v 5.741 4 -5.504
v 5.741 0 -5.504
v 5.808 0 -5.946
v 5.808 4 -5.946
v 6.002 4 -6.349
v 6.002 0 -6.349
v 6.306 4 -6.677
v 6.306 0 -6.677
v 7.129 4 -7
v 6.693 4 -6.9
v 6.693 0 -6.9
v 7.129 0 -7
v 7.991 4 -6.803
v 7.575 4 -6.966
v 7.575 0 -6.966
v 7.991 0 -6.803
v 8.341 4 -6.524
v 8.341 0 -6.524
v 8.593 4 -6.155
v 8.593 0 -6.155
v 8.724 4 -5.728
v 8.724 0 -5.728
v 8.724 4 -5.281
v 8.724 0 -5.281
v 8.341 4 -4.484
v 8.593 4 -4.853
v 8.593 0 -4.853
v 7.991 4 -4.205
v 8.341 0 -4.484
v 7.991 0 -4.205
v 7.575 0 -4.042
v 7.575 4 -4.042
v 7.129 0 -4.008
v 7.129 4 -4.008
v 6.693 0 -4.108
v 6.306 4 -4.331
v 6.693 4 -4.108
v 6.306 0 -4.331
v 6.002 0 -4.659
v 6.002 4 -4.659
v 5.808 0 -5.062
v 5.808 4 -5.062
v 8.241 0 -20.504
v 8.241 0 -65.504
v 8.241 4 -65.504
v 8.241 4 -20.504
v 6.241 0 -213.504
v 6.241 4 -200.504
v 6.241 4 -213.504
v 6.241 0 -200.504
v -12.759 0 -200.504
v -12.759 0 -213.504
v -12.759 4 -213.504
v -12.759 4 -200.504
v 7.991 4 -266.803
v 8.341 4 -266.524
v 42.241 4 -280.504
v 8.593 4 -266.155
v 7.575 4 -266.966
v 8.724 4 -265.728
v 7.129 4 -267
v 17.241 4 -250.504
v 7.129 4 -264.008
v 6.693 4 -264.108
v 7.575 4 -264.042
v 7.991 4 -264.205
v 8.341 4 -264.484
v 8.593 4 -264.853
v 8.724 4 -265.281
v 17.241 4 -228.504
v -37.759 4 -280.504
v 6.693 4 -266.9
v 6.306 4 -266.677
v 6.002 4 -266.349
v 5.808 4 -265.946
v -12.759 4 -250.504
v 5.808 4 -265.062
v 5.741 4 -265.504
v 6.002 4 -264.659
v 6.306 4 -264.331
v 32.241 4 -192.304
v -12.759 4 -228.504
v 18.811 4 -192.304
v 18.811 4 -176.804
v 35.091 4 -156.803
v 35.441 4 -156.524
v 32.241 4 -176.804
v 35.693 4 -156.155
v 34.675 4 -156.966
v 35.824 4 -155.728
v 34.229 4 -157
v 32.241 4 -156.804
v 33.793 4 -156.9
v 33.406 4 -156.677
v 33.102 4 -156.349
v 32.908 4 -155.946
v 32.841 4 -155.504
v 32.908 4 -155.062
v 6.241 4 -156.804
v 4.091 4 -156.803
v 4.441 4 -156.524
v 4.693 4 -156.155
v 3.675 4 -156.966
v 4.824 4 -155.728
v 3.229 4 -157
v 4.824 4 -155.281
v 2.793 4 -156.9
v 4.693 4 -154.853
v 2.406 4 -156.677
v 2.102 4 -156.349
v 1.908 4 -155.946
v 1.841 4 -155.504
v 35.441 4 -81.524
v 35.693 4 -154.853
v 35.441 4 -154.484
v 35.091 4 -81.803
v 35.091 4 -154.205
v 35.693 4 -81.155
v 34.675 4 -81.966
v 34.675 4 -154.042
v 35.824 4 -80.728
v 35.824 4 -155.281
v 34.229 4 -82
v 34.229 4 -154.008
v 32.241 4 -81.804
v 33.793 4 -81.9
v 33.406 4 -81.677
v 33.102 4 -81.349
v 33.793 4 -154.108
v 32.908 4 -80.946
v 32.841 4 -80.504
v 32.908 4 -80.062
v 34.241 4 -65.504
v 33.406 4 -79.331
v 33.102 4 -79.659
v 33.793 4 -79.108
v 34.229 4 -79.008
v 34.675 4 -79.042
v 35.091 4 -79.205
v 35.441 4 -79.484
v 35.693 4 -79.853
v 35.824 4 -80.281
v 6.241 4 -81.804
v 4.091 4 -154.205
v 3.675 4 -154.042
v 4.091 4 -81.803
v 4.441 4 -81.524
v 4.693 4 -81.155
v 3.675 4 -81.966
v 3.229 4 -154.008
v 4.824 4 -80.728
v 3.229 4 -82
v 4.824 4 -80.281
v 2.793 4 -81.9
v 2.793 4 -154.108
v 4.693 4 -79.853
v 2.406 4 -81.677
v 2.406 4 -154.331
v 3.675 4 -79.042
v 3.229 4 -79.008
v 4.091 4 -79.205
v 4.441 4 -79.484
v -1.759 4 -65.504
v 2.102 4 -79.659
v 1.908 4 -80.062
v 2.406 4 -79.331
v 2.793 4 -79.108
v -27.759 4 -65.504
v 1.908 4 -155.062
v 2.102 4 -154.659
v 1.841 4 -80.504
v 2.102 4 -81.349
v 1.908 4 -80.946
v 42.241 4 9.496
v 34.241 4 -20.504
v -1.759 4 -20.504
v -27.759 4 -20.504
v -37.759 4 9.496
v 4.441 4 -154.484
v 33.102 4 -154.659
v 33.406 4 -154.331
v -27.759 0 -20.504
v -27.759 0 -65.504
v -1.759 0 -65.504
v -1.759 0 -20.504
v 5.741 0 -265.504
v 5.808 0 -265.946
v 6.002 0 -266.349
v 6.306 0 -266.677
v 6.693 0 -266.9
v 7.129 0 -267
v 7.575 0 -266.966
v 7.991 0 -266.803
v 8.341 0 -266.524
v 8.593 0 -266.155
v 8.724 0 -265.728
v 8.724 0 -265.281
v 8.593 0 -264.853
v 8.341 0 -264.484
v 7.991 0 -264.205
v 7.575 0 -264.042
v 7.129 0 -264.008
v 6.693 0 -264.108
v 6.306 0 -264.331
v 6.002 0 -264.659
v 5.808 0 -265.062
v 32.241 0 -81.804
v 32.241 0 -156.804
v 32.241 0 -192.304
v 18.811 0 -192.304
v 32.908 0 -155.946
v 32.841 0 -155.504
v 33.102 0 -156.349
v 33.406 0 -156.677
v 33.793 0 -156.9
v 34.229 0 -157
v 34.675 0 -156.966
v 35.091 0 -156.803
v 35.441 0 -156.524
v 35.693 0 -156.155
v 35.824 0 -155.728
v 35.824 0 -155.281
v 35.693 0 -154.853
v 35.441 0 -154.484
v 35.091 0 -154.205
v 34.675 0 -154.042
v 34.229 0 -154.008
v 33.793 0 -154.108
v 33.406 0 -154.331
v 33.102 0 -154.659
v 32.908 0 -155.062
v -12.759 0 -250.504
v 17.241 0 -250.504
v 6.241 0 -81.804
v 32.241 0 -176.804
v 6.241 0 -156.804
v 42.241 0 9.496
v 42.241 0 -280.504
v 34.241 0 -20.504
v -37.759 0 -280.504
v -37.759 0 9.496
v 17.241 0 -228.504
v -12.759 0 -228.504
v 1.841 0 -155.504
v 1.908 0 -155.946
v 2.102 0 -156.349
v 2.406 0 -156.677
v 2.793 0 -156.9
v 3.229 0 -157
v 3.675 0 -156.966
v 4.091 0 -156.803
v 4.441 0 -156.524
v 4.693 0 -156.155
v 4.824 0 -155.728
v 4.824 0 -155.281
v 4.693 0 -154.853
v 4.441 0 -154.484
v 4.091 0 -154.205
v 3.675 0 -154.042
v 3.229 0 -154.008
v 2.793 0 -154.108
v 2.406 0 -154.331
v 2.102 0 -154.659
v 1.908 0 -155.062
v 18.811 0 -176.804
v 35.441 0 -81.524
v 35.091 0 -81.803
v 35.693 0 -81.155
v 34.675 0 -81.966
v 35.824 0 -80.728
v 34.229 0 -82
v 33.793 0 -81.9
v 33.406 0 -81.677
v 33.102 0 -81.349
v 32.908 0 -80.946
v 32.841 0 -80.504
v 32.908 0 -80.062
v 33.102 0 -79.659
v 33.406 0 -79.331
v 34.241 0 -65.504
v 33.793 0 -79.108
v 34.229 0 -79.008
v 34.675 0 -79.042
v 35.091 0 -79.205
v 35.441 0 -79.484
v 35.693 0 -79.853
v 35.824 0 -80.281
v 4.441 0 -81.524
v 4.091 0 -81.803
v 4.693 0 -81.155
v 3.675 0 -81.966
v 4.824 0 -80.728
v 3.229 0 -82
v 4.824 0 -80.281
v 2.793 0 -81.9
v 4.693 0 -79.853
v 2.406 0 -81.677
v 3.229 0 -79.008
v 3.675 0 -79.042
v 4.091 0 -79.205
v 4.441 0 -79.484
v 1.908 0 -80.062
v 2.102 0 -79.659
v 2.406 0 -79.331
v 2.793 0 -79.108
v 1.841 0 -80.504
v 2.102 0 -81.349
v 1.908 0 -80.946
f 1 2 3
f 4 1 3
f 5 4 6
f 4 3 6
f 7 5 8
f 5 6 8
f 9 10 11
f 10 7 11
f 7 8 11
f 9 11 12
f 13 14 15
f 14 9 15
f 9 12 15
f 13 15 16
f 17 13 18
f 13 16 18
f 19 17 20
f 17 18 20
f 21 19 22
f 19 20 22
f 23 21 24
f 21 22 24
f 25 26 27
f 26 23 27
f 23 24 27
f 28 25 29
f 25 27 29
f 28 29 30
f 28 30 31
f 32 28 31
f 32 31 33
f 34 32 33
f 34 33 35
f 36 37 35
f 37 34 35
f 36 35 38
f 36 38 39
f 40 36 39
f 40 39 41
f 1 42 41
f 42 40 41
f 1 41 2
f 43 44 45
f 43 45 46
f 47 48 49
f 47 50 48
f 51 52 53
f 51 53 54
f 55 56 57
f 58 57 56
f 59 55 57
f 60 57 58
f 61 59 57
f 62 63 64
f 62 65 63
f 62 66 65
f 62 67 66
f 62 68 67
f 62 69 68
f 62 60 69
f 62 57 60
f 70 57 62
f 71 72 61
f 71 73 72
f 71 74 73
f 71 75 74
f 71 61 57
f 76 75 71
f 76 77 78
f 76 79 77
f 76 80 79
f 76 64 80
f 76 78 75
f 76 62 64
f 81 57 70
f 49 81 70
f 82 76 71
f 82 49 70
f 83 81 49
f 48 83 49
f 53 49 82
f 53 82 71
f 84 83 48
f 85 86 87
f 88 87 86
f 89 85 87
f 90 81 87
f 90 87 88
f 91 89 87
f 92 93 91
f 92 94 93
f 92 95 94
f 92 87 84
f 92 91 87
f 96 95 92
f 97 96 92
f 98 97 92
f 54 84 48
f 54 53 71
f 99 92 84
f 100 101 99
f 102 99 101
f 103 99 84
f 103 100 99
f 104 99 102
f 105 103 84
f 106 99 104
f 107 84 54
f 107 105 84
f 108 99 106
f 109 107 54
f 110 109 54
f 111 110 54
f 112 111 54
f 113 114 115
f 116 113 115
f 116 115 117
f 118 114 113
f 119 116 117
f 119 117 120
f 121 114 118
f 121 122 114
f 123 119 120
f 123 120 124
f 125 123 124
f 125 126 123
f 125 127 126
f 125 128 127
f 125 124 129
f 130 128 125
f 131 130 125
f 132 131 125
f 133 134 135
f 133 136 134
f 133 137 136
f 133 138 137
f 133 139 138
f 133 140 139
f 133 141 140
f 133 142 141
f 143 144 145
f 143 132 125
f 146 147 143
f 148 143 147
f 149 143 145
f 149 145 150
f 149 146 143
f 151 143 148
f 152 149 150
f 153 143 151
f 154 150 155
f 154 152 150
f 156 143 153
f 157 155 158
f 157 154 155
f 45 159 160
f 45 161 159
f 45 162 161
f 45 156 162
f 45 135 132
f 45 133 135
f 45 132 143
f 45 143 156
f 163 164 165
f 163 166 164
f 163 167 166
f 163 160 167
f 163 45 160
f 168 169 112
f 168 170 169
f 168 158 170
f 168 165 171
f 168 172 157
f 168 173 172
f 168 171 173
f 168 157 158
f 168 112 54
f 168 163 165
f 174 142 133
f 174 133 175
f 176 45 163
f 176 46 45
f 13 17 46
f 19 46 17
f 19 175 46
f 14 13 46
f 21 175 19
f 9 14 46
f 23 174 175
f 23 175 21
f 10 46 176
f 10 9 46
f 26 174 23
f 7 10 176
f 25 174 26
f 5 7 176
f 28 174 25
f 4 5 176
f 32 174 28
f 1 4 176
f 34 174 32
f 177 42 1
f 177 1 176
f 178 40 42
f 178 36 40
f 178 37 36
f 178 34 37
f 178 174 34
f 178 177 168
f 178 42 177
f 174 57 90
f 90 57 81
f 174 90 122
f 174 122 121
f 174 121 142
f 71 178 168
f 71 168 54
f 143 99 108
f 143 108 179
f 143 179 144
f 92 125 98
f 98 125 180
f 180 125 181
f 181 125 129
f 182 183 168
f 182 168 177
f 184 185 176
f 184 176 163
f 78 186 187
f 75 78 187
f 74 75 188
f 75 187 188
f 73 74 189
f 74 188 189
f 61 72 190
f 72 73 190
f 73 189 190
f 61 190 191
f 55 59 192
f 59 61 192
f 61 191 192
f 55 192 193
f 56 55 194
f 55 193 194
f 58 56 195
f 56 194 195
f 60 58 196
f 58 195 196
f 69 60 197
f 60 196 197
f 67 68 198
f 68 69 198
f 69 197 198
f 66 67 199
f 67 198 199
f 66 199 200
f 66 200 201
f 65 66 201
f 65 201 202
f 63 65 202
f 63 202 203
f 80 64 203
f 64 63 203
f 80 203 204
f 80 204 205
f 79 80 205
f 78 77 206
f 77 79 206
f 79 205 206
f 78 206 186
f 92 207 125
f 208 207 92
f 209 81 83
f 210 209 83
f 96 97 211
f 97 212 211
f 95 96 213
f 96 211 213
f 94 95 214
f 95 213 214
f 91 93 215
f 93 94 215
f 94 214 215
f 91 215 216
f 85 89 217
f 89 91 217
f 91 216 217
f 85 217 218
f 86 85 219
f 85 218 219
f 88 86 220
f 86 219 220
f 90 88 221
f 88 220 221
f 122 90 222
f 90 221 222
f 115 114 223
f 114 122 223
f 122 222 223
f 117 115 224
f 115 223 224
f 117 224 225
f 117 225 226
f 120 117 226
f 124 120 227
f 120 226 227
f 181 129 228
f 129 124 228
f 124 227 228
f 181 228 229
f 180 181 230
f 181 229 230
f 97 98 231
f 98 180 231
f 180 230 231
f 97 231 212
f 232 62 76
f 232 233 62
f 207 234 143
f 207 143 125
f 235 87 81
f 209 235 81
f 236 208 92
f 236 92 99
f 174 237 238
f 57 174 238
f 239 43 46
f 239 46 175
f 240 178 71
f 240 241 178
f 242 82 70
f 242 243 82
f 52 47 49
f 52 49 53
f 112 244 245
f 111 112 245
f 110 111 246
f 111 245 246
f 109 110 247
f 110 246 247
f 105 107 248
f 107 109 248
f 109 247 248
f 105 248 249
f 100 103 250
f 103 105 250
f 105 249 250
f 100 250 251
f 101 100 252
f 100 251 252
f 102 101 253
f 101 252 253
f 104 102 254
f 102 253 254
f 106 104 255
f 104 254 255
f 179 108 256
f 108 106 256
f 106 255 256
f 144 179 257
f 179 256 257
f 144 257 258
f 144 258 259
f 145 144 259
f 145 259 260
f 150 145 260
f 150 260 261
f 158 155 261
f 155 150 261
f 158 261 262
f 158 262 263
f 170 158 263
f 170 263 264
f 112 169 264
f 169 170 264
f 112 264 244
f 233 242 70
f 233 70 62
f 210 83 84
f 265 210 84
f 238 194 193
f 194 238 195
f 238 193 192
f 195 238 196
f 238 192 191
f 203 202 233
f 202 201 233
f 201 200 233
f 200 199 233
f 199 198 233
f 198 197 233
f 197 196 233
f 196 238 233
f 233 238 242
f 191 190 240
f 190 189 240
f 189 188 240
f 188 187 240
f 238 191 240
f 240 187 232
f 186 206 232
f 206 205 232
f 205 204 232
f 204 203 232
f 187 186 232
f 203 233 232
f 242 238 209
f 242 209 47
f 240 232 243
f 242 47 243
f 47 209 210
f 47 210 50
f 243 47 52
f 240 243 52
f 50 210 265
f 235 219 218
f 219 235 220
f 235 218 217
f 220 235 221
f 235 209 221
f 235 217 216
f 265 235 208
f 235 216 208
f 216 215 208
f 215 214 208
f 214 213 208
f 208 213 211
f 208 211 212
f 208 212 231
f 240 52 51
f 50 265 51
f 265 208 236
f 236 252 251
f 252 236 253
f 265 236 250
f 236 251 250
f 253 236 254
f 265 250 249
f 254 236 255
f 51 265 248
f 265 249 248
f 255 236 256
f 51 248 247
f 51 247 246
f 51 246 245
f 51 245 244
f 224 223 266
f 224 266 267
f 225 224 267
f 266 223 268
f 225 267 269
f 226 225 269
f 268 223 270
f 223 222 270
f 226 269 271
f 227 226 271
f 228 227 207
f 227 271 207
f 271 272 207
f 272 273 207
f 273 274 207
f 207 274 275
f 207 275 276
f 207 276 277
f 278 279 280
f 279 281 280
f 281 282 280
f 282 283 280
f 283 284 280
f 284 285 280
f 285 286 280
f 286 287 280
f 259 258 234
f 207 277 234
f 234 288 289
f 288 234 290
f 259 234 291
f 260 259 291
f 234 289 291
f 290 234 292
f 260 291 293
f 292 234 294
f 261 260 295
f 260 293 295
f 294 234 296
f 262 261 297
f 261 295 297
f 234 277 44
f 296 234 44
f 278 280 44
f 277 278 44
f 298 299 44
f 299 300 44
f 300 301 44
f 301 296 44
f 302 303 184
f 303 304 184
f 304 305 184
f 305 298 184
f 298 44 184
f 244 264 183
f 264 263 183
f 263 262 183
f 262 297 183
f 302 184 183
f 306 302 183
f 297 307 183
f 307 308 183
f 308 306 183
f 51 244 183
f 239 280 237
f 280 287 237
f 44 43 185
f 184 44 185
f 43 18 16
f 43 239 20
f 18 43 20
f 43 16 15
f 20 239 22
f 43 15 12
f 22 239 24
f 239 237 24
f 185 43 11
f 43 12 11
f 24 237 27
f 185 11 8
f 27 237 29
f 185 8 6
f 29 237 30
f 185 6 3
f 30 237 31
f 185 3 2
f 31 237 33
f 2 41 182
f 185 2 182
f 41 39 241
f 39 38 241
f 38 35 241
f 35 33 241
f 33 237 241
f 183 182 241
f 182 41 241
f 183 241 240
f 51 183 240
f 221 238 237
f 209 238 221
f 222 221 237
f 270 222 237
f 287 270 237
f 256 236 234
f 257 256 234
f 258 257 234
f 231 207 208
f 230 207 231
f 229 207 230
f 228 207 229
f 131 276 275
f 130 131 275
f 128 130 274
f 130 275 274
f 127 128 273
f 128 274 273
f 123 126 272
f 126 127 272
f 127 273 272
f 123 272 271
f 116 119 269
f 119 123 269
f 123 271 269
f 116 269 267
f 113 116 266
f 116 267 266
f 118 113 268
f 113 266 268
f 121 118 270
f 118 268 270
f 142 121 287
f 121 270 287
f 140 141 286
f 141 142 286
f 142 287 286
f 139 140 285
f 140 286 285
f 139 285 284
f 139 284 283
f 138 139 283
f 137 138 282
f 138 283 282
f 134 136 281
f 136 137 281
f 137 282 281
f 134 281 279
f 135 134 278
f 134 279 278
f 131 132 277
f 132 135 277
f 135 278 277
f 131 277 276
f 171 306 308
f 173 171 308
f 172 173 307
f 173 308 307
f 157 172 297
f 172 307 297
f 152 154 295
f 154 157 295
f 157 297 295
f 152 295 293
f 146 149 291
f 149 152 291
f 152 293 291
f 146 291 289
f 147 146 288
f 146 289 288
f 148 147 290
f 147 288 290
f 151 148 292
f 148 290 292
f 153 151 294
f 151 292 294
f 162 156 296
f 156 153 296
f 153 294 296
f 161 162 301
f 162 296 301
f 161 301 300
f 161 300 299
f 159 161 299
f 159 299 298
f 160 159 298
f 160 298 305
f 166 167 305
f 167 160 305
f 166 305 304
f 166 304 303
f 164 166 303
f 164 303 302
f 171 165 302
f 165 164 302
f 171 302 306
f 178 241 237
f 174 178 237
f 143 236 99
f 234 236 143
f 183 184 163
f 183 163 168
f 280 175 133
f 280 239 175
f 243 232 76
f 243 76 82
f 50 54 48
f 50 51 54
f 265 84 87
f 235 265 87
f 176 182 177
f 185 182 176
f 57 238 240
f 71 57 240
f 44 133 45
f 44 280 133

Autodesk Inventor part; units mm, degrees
ref_plane "YZ Plane" through (0, 0, 0) normal (1, 0, 0) x (0, 1, 0)
ref_plane "XZ Plane" through (0, 0, 0) normal (0, 1, 0) x (-1, 0, 0)
ref_plane "XY Plane" through (0, 0, 0) normal (0, 0, 1) x (1, 0, 0)
sketch "Sketch1" plane through (0, 0, 0) normal (0, 1, 0) x (-1, 0, 0)
  line L0 (37.7589, 9.4959) -> (-42.2411, 9.4959)
  line L1 (-42.2411, 9.4959) -> (-42.2411, -280.5041)
  line L2 (-42.2411, -280.5041) -> (37.7589, -280.5041)
  line L3 (27.7589, -20.5041) -> (1.7589, -20.5041)
  line L4 (1.7589, -20.5041) -> (1.7589, -65.5041)
  line L5 (1.7589, -65.5041) -> (27.7589, -65.5041)
  line L6 (27.7589, -65.5041) -> (27.7589, -20.5041)
  line L7 (-8.2411, -20.5041) -> (-34.2411, -20.5041)
  line L8 (-34.2411, -20.5041) -> (-34.2411, -65.5041)
  line L9 (-34.2411, -65.5041) -> (-8.2411, -65.5041)
  line L10 (-8.2411, -65.5041) -> (-8.2411, -20.5041)
  line L11 (-6.2411, -81.8041) -> (-32.2411, -81.8041)
  line L12 (-32.2411, -81.8041) -> (-32.2411, -156.8041)
  line L13 (-32.2411, -156.8041) -> (-6.2411, -156.8041)
  line L14 (-6.2411, -156.8041) -> (-6.2411, -81.8041)
  circle A0 centre (-3.3411, -80.5041) radius 1.5
  circle A1 centre (-34.3411, -80.5041) radius 1.5
  circle A2 centre (-3.3411, -155.5041) radius 1.5
  circle A3 centre (-34.3411, -155.5041) radius 1.5
  line L15 (37.7589, 9.4959) -> (37.7589, -280.5041)
  line L16 (37.7589, -170.5041) -> (37.7589, -280.5041)
  line L17 (12.7589, -228.5041) -> (-17.2411, -228.5041)
  line L18 (-17.2411, -228.5041) -> (-17.2411, -250.5041)
  line L19 (-17.2411, -250.5041) -> (12.7589, -250.5041)
  line L20 (12.7589, -250.5041) -> (12.7589, -228.5041)
  line L21 (12.7589, -200.5041) -> (-6.2411, -200.5041)
  line L22 (-6.2411, -200.5041) -> (-6.2411, -213.5041)
  line L23 (-6.2411, -213.5041) -> (12.7589, -213.5041)
  line L24 (12.7589, -213.5041) -> (12.7589, -200.5041)
  circle A4 centre (-7.2411, -265.5041) radius 1.5
  circle A5 centre (-7.2411, -5.5041) radius 1.5
  point P0 (0, 0)
  dimension "d0" = 290
  dimension "d1" = 80
  dimension "d4" = 45
  dimension "d5" = 26
  dimension "d6" = 30
  dimension "d8" = 45
  dimension "d9" = 26
  dimension "d10" = 30
  dimension "d11" = 10
  dimension "d12" = 75
  dimension "d13" = 26
  dimension "d16" = 1.3
  dimension "d17" = 2.9
  dimension "d18" = 3
  dimension "d20" = 31
  dimension "d22" = 3
  dimension "d23" = 75
  dimension "d24" = 3
  dimension "d25" = 75
  dimension "d26" = 3
  dimension "d27" = 15
  dimension "d28" = 10
  dimension "d32" = 22
  dimension "d33" = 30
  dimension "d34" = 25
  dimension "d35" = 30
  dimension "d36" = 13
  dimension "d37" = 19
  dimension "d38" = 25
  dimension "d39" = 15
  dimension "d40" = 45
  dimension "d41" = 15
  dimension "d42" = 3
  dimension "d43" = 45
  dimension "d44" = 15
  dimension "d45" = 3
extrude "Extrusion1" add sketch "Sketch1" along normal blind 4
sketch "Esquisse2" plane through (0, 4, 0) normal (0, 1, 0) x (1, 0, 0)
  line L0 (18.8111, 176.8041) -> (32.2411, 176.8041)
  line L1 (32.2411, 176.8041) -> (32.2411, 192.3041)
  line L2 (32.2411, 192.3041) -> (18.8111, 192.3041)
  line L3 (18.8111, 192.3041) -> (18.8111, 176.8041)
  line L4 (42.2411, -9.4959) -> (42.2411, 280.5041) projected
  line L5 (6.2411, 156.8041) -> (32.2411, 156.8041) projected
  point P0 (0, 0)
  dimension "d46" = 15.5
  dimension "d47" = 13.43
  dimension "d48" = 10
  dimension "d49" = 20
extrude "Extrusion2" cut sketch "Esquisse2" against normal through all
properties part number "support_arriere"
